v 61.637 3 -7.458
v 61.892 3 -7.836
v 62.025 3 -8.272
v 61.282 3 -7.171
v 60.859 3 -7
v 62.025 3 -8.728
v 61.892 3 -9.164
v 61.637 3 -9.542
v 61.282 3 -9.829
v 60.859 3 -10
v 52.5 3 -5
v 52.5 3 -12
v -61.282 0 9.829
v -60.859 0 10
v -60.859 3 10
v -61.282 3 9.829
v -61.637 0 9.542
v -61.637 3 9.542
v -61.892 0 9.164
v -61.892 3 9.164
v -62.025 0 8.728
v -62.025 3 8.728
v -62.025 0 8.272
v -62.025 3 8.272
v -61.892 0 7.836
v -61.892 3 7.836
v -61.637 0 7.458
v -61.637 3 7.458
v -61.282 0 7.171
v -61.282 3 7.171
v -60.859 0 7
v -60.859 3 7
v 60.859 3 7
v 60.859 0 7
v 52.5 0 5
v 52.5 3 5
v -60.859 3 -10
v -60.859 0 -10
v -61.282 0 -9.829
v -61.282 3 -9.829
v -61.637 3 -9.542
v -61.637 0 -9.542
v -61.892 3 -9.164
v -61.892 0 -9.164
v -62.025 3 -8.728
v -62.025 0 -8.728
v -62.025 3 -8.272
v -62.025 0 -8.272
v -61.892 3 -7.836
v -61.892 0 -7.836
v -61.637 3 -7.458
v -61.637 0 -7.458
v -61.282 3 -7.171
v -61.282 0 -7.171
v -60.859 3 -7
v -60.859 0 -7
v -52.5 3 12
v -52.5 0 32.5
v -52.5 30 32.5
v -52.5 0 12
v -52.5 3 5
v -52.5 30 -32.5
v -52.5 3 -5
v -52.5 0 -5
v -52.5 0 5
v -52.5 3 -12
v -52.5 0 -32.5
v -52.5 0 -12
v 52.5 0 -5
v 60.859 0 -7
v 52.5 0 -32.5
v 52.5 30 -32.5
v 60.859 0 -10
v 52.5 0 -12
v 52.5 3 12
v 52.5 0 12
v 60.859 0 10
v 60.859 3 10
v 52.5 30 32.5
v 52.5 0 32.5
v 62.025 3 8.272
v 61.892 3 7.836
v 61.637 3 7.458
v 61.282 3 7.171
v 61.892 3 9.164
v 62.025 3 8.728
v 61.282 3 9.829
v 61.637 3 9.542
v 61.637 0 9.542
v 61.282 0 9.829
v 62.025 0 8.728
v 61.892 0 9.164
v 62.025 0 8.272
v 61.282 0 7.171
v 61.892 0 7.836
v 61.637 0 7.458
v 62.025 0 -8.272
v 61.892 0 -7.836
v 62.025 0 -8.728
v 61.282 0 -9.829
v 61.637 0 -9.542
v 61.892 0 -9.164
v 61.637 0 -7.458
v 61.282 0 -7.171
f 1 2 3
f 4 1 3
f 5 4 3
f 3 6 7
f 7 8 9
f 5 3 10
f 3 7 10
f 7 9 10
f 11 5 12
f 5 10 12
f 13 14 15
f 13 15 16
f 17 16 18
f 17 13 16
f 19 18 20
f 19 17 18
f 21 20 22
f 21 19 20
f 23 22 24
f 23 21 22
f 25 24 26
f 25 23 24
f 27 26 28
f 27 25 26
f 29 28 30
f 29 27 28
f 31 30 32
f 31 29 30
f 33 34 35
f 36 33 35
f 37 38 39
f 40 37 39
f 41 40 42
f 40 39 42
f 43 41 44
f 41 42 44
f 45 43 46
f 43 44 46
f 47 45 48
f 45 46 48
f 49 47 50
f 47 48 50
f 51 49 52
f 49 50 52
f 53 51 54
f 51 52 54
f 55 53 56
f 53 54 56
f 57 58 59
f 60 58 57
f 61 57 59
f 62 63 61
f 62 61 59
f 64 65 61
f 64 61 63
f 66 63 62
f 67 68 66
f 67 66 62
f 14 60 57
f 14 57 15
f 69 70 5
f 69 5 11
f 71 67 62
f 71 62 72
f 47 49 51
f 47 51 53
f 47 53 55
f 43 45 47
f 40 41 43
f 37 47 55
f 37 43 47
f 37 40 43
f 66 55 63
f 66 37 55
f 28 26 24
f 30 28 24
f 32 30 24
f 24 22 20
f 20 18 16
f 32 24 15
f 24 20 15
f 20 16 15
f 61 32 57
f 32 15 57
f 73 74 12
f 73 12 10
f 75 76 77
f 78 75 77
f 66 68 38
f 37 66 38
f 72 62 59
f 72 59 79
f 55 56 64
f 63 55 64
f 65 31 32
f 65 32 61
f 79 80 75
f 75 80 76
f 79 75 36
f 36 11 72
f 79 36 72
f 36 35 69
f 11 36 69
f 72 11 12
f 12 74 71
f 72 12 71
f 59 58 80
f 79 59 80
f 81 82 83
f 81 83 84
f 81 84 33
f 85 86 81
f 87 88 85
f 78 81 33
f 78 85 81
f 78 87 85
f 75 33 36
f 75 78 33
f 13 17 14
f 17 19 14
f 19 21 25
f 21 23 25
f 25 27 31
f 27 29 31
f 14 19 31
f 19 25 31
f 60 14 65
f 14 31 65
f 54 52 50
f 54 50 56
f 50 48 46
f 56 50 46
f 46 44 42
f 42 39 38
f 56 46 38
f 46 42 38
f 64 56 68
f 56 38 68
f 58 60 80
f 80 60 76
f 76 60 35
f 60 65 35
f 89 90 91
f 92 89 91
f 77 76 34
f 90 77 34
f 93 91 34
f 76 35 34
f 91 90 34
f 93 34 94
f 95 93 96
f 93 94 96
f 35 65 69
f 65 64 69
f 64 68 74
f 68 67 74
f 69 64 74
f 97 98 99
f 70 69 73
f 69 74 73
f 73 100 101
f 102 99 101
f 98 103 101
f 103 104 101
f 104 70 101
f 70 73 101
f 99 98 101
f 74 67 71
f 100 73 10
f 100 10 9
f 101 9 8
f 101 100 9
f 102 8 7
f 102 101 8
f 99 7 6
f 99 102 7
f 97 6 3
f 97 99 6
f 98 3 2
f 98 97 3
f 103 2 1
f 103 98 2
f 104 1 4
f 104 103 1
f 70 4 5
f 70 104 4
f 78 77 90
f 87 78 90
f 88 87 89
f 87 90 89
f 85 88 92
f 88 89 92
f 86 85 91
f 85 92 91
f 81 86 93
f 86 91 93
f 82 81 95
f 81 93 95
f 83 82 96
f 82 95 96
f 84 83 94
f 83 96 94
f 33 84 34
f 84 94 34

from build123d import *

# Parameters (mm, degrees)
SKETCH1_W            = 105
SKETCH1_H            = 65
BOSS_EXTRUDE1_DEPTH  = 30
BOSS_EXTRUDE2_DEPTH  = 3
MIRROR2_COPY_1_DEPTH = 3


with BuildPart() as part:
    # Sketch1 → Boss-Extrude1 (new body)
    with BuildSketch(Plane(origin=(0, 0, 0), x_dir=(1, 0, 0), z_dir=(0, 1, 0))):
        Rectangle(SKETCH1_W, SKETCH1_H)
    extrude(amount=BOSS_EXTRUDE1_DEPTH)

    # Sketch3 → Boss-Extrude2 (add)
    with BuildSketch(Plane.XZ):
        with BuildLine():
            Line((52.5, 12), (60.858898944, 10))
            ThreePointArc((60.858898944, 10), (62.042338631, 8.5), (60.858898944, 7))
            Line((60.858898944, 7), (52.5, 5))
            Line((52.5, 5), (52.5, 12))
        make_face()
    boss_extrude2 = extrude(amount=-BOSS_EXTRUDE2_DEPTH)

    # Mirror1: Boss-Extrude2 across plane
    add(boss_extrude2.mirror(Plane.XY))

    # Mirror2: Boss-Extrude2 across plane
    add(boss_extrude2.mirror(Plane(origin=(0, 0, 0), x_dir=(0, 0, 1), z_dir=(1, 0, 0))))

    # Mirror2 copy 1 sketch → Mirror2 copy 1 (add)
    with BuildSketch(Plane(origin=(0, 0, 0), x_dir=(-1, 0, 0), z_dir=(0, -1, 0))):
        with BuildLine():
            Line((52.5, 12), (60.858898944, 10))
            ThreePointArc((60.858898944, 10), (62.042338631, 8.5), (60.858898944, 7))
            Line((60.858898944, 7), (52.5, 5))
            Line((52.5, 5), (52.5, 12))
        make_face()
    extrude(amount=-MIRROR2_COPY_1_DEPTH)


solid = part.part
